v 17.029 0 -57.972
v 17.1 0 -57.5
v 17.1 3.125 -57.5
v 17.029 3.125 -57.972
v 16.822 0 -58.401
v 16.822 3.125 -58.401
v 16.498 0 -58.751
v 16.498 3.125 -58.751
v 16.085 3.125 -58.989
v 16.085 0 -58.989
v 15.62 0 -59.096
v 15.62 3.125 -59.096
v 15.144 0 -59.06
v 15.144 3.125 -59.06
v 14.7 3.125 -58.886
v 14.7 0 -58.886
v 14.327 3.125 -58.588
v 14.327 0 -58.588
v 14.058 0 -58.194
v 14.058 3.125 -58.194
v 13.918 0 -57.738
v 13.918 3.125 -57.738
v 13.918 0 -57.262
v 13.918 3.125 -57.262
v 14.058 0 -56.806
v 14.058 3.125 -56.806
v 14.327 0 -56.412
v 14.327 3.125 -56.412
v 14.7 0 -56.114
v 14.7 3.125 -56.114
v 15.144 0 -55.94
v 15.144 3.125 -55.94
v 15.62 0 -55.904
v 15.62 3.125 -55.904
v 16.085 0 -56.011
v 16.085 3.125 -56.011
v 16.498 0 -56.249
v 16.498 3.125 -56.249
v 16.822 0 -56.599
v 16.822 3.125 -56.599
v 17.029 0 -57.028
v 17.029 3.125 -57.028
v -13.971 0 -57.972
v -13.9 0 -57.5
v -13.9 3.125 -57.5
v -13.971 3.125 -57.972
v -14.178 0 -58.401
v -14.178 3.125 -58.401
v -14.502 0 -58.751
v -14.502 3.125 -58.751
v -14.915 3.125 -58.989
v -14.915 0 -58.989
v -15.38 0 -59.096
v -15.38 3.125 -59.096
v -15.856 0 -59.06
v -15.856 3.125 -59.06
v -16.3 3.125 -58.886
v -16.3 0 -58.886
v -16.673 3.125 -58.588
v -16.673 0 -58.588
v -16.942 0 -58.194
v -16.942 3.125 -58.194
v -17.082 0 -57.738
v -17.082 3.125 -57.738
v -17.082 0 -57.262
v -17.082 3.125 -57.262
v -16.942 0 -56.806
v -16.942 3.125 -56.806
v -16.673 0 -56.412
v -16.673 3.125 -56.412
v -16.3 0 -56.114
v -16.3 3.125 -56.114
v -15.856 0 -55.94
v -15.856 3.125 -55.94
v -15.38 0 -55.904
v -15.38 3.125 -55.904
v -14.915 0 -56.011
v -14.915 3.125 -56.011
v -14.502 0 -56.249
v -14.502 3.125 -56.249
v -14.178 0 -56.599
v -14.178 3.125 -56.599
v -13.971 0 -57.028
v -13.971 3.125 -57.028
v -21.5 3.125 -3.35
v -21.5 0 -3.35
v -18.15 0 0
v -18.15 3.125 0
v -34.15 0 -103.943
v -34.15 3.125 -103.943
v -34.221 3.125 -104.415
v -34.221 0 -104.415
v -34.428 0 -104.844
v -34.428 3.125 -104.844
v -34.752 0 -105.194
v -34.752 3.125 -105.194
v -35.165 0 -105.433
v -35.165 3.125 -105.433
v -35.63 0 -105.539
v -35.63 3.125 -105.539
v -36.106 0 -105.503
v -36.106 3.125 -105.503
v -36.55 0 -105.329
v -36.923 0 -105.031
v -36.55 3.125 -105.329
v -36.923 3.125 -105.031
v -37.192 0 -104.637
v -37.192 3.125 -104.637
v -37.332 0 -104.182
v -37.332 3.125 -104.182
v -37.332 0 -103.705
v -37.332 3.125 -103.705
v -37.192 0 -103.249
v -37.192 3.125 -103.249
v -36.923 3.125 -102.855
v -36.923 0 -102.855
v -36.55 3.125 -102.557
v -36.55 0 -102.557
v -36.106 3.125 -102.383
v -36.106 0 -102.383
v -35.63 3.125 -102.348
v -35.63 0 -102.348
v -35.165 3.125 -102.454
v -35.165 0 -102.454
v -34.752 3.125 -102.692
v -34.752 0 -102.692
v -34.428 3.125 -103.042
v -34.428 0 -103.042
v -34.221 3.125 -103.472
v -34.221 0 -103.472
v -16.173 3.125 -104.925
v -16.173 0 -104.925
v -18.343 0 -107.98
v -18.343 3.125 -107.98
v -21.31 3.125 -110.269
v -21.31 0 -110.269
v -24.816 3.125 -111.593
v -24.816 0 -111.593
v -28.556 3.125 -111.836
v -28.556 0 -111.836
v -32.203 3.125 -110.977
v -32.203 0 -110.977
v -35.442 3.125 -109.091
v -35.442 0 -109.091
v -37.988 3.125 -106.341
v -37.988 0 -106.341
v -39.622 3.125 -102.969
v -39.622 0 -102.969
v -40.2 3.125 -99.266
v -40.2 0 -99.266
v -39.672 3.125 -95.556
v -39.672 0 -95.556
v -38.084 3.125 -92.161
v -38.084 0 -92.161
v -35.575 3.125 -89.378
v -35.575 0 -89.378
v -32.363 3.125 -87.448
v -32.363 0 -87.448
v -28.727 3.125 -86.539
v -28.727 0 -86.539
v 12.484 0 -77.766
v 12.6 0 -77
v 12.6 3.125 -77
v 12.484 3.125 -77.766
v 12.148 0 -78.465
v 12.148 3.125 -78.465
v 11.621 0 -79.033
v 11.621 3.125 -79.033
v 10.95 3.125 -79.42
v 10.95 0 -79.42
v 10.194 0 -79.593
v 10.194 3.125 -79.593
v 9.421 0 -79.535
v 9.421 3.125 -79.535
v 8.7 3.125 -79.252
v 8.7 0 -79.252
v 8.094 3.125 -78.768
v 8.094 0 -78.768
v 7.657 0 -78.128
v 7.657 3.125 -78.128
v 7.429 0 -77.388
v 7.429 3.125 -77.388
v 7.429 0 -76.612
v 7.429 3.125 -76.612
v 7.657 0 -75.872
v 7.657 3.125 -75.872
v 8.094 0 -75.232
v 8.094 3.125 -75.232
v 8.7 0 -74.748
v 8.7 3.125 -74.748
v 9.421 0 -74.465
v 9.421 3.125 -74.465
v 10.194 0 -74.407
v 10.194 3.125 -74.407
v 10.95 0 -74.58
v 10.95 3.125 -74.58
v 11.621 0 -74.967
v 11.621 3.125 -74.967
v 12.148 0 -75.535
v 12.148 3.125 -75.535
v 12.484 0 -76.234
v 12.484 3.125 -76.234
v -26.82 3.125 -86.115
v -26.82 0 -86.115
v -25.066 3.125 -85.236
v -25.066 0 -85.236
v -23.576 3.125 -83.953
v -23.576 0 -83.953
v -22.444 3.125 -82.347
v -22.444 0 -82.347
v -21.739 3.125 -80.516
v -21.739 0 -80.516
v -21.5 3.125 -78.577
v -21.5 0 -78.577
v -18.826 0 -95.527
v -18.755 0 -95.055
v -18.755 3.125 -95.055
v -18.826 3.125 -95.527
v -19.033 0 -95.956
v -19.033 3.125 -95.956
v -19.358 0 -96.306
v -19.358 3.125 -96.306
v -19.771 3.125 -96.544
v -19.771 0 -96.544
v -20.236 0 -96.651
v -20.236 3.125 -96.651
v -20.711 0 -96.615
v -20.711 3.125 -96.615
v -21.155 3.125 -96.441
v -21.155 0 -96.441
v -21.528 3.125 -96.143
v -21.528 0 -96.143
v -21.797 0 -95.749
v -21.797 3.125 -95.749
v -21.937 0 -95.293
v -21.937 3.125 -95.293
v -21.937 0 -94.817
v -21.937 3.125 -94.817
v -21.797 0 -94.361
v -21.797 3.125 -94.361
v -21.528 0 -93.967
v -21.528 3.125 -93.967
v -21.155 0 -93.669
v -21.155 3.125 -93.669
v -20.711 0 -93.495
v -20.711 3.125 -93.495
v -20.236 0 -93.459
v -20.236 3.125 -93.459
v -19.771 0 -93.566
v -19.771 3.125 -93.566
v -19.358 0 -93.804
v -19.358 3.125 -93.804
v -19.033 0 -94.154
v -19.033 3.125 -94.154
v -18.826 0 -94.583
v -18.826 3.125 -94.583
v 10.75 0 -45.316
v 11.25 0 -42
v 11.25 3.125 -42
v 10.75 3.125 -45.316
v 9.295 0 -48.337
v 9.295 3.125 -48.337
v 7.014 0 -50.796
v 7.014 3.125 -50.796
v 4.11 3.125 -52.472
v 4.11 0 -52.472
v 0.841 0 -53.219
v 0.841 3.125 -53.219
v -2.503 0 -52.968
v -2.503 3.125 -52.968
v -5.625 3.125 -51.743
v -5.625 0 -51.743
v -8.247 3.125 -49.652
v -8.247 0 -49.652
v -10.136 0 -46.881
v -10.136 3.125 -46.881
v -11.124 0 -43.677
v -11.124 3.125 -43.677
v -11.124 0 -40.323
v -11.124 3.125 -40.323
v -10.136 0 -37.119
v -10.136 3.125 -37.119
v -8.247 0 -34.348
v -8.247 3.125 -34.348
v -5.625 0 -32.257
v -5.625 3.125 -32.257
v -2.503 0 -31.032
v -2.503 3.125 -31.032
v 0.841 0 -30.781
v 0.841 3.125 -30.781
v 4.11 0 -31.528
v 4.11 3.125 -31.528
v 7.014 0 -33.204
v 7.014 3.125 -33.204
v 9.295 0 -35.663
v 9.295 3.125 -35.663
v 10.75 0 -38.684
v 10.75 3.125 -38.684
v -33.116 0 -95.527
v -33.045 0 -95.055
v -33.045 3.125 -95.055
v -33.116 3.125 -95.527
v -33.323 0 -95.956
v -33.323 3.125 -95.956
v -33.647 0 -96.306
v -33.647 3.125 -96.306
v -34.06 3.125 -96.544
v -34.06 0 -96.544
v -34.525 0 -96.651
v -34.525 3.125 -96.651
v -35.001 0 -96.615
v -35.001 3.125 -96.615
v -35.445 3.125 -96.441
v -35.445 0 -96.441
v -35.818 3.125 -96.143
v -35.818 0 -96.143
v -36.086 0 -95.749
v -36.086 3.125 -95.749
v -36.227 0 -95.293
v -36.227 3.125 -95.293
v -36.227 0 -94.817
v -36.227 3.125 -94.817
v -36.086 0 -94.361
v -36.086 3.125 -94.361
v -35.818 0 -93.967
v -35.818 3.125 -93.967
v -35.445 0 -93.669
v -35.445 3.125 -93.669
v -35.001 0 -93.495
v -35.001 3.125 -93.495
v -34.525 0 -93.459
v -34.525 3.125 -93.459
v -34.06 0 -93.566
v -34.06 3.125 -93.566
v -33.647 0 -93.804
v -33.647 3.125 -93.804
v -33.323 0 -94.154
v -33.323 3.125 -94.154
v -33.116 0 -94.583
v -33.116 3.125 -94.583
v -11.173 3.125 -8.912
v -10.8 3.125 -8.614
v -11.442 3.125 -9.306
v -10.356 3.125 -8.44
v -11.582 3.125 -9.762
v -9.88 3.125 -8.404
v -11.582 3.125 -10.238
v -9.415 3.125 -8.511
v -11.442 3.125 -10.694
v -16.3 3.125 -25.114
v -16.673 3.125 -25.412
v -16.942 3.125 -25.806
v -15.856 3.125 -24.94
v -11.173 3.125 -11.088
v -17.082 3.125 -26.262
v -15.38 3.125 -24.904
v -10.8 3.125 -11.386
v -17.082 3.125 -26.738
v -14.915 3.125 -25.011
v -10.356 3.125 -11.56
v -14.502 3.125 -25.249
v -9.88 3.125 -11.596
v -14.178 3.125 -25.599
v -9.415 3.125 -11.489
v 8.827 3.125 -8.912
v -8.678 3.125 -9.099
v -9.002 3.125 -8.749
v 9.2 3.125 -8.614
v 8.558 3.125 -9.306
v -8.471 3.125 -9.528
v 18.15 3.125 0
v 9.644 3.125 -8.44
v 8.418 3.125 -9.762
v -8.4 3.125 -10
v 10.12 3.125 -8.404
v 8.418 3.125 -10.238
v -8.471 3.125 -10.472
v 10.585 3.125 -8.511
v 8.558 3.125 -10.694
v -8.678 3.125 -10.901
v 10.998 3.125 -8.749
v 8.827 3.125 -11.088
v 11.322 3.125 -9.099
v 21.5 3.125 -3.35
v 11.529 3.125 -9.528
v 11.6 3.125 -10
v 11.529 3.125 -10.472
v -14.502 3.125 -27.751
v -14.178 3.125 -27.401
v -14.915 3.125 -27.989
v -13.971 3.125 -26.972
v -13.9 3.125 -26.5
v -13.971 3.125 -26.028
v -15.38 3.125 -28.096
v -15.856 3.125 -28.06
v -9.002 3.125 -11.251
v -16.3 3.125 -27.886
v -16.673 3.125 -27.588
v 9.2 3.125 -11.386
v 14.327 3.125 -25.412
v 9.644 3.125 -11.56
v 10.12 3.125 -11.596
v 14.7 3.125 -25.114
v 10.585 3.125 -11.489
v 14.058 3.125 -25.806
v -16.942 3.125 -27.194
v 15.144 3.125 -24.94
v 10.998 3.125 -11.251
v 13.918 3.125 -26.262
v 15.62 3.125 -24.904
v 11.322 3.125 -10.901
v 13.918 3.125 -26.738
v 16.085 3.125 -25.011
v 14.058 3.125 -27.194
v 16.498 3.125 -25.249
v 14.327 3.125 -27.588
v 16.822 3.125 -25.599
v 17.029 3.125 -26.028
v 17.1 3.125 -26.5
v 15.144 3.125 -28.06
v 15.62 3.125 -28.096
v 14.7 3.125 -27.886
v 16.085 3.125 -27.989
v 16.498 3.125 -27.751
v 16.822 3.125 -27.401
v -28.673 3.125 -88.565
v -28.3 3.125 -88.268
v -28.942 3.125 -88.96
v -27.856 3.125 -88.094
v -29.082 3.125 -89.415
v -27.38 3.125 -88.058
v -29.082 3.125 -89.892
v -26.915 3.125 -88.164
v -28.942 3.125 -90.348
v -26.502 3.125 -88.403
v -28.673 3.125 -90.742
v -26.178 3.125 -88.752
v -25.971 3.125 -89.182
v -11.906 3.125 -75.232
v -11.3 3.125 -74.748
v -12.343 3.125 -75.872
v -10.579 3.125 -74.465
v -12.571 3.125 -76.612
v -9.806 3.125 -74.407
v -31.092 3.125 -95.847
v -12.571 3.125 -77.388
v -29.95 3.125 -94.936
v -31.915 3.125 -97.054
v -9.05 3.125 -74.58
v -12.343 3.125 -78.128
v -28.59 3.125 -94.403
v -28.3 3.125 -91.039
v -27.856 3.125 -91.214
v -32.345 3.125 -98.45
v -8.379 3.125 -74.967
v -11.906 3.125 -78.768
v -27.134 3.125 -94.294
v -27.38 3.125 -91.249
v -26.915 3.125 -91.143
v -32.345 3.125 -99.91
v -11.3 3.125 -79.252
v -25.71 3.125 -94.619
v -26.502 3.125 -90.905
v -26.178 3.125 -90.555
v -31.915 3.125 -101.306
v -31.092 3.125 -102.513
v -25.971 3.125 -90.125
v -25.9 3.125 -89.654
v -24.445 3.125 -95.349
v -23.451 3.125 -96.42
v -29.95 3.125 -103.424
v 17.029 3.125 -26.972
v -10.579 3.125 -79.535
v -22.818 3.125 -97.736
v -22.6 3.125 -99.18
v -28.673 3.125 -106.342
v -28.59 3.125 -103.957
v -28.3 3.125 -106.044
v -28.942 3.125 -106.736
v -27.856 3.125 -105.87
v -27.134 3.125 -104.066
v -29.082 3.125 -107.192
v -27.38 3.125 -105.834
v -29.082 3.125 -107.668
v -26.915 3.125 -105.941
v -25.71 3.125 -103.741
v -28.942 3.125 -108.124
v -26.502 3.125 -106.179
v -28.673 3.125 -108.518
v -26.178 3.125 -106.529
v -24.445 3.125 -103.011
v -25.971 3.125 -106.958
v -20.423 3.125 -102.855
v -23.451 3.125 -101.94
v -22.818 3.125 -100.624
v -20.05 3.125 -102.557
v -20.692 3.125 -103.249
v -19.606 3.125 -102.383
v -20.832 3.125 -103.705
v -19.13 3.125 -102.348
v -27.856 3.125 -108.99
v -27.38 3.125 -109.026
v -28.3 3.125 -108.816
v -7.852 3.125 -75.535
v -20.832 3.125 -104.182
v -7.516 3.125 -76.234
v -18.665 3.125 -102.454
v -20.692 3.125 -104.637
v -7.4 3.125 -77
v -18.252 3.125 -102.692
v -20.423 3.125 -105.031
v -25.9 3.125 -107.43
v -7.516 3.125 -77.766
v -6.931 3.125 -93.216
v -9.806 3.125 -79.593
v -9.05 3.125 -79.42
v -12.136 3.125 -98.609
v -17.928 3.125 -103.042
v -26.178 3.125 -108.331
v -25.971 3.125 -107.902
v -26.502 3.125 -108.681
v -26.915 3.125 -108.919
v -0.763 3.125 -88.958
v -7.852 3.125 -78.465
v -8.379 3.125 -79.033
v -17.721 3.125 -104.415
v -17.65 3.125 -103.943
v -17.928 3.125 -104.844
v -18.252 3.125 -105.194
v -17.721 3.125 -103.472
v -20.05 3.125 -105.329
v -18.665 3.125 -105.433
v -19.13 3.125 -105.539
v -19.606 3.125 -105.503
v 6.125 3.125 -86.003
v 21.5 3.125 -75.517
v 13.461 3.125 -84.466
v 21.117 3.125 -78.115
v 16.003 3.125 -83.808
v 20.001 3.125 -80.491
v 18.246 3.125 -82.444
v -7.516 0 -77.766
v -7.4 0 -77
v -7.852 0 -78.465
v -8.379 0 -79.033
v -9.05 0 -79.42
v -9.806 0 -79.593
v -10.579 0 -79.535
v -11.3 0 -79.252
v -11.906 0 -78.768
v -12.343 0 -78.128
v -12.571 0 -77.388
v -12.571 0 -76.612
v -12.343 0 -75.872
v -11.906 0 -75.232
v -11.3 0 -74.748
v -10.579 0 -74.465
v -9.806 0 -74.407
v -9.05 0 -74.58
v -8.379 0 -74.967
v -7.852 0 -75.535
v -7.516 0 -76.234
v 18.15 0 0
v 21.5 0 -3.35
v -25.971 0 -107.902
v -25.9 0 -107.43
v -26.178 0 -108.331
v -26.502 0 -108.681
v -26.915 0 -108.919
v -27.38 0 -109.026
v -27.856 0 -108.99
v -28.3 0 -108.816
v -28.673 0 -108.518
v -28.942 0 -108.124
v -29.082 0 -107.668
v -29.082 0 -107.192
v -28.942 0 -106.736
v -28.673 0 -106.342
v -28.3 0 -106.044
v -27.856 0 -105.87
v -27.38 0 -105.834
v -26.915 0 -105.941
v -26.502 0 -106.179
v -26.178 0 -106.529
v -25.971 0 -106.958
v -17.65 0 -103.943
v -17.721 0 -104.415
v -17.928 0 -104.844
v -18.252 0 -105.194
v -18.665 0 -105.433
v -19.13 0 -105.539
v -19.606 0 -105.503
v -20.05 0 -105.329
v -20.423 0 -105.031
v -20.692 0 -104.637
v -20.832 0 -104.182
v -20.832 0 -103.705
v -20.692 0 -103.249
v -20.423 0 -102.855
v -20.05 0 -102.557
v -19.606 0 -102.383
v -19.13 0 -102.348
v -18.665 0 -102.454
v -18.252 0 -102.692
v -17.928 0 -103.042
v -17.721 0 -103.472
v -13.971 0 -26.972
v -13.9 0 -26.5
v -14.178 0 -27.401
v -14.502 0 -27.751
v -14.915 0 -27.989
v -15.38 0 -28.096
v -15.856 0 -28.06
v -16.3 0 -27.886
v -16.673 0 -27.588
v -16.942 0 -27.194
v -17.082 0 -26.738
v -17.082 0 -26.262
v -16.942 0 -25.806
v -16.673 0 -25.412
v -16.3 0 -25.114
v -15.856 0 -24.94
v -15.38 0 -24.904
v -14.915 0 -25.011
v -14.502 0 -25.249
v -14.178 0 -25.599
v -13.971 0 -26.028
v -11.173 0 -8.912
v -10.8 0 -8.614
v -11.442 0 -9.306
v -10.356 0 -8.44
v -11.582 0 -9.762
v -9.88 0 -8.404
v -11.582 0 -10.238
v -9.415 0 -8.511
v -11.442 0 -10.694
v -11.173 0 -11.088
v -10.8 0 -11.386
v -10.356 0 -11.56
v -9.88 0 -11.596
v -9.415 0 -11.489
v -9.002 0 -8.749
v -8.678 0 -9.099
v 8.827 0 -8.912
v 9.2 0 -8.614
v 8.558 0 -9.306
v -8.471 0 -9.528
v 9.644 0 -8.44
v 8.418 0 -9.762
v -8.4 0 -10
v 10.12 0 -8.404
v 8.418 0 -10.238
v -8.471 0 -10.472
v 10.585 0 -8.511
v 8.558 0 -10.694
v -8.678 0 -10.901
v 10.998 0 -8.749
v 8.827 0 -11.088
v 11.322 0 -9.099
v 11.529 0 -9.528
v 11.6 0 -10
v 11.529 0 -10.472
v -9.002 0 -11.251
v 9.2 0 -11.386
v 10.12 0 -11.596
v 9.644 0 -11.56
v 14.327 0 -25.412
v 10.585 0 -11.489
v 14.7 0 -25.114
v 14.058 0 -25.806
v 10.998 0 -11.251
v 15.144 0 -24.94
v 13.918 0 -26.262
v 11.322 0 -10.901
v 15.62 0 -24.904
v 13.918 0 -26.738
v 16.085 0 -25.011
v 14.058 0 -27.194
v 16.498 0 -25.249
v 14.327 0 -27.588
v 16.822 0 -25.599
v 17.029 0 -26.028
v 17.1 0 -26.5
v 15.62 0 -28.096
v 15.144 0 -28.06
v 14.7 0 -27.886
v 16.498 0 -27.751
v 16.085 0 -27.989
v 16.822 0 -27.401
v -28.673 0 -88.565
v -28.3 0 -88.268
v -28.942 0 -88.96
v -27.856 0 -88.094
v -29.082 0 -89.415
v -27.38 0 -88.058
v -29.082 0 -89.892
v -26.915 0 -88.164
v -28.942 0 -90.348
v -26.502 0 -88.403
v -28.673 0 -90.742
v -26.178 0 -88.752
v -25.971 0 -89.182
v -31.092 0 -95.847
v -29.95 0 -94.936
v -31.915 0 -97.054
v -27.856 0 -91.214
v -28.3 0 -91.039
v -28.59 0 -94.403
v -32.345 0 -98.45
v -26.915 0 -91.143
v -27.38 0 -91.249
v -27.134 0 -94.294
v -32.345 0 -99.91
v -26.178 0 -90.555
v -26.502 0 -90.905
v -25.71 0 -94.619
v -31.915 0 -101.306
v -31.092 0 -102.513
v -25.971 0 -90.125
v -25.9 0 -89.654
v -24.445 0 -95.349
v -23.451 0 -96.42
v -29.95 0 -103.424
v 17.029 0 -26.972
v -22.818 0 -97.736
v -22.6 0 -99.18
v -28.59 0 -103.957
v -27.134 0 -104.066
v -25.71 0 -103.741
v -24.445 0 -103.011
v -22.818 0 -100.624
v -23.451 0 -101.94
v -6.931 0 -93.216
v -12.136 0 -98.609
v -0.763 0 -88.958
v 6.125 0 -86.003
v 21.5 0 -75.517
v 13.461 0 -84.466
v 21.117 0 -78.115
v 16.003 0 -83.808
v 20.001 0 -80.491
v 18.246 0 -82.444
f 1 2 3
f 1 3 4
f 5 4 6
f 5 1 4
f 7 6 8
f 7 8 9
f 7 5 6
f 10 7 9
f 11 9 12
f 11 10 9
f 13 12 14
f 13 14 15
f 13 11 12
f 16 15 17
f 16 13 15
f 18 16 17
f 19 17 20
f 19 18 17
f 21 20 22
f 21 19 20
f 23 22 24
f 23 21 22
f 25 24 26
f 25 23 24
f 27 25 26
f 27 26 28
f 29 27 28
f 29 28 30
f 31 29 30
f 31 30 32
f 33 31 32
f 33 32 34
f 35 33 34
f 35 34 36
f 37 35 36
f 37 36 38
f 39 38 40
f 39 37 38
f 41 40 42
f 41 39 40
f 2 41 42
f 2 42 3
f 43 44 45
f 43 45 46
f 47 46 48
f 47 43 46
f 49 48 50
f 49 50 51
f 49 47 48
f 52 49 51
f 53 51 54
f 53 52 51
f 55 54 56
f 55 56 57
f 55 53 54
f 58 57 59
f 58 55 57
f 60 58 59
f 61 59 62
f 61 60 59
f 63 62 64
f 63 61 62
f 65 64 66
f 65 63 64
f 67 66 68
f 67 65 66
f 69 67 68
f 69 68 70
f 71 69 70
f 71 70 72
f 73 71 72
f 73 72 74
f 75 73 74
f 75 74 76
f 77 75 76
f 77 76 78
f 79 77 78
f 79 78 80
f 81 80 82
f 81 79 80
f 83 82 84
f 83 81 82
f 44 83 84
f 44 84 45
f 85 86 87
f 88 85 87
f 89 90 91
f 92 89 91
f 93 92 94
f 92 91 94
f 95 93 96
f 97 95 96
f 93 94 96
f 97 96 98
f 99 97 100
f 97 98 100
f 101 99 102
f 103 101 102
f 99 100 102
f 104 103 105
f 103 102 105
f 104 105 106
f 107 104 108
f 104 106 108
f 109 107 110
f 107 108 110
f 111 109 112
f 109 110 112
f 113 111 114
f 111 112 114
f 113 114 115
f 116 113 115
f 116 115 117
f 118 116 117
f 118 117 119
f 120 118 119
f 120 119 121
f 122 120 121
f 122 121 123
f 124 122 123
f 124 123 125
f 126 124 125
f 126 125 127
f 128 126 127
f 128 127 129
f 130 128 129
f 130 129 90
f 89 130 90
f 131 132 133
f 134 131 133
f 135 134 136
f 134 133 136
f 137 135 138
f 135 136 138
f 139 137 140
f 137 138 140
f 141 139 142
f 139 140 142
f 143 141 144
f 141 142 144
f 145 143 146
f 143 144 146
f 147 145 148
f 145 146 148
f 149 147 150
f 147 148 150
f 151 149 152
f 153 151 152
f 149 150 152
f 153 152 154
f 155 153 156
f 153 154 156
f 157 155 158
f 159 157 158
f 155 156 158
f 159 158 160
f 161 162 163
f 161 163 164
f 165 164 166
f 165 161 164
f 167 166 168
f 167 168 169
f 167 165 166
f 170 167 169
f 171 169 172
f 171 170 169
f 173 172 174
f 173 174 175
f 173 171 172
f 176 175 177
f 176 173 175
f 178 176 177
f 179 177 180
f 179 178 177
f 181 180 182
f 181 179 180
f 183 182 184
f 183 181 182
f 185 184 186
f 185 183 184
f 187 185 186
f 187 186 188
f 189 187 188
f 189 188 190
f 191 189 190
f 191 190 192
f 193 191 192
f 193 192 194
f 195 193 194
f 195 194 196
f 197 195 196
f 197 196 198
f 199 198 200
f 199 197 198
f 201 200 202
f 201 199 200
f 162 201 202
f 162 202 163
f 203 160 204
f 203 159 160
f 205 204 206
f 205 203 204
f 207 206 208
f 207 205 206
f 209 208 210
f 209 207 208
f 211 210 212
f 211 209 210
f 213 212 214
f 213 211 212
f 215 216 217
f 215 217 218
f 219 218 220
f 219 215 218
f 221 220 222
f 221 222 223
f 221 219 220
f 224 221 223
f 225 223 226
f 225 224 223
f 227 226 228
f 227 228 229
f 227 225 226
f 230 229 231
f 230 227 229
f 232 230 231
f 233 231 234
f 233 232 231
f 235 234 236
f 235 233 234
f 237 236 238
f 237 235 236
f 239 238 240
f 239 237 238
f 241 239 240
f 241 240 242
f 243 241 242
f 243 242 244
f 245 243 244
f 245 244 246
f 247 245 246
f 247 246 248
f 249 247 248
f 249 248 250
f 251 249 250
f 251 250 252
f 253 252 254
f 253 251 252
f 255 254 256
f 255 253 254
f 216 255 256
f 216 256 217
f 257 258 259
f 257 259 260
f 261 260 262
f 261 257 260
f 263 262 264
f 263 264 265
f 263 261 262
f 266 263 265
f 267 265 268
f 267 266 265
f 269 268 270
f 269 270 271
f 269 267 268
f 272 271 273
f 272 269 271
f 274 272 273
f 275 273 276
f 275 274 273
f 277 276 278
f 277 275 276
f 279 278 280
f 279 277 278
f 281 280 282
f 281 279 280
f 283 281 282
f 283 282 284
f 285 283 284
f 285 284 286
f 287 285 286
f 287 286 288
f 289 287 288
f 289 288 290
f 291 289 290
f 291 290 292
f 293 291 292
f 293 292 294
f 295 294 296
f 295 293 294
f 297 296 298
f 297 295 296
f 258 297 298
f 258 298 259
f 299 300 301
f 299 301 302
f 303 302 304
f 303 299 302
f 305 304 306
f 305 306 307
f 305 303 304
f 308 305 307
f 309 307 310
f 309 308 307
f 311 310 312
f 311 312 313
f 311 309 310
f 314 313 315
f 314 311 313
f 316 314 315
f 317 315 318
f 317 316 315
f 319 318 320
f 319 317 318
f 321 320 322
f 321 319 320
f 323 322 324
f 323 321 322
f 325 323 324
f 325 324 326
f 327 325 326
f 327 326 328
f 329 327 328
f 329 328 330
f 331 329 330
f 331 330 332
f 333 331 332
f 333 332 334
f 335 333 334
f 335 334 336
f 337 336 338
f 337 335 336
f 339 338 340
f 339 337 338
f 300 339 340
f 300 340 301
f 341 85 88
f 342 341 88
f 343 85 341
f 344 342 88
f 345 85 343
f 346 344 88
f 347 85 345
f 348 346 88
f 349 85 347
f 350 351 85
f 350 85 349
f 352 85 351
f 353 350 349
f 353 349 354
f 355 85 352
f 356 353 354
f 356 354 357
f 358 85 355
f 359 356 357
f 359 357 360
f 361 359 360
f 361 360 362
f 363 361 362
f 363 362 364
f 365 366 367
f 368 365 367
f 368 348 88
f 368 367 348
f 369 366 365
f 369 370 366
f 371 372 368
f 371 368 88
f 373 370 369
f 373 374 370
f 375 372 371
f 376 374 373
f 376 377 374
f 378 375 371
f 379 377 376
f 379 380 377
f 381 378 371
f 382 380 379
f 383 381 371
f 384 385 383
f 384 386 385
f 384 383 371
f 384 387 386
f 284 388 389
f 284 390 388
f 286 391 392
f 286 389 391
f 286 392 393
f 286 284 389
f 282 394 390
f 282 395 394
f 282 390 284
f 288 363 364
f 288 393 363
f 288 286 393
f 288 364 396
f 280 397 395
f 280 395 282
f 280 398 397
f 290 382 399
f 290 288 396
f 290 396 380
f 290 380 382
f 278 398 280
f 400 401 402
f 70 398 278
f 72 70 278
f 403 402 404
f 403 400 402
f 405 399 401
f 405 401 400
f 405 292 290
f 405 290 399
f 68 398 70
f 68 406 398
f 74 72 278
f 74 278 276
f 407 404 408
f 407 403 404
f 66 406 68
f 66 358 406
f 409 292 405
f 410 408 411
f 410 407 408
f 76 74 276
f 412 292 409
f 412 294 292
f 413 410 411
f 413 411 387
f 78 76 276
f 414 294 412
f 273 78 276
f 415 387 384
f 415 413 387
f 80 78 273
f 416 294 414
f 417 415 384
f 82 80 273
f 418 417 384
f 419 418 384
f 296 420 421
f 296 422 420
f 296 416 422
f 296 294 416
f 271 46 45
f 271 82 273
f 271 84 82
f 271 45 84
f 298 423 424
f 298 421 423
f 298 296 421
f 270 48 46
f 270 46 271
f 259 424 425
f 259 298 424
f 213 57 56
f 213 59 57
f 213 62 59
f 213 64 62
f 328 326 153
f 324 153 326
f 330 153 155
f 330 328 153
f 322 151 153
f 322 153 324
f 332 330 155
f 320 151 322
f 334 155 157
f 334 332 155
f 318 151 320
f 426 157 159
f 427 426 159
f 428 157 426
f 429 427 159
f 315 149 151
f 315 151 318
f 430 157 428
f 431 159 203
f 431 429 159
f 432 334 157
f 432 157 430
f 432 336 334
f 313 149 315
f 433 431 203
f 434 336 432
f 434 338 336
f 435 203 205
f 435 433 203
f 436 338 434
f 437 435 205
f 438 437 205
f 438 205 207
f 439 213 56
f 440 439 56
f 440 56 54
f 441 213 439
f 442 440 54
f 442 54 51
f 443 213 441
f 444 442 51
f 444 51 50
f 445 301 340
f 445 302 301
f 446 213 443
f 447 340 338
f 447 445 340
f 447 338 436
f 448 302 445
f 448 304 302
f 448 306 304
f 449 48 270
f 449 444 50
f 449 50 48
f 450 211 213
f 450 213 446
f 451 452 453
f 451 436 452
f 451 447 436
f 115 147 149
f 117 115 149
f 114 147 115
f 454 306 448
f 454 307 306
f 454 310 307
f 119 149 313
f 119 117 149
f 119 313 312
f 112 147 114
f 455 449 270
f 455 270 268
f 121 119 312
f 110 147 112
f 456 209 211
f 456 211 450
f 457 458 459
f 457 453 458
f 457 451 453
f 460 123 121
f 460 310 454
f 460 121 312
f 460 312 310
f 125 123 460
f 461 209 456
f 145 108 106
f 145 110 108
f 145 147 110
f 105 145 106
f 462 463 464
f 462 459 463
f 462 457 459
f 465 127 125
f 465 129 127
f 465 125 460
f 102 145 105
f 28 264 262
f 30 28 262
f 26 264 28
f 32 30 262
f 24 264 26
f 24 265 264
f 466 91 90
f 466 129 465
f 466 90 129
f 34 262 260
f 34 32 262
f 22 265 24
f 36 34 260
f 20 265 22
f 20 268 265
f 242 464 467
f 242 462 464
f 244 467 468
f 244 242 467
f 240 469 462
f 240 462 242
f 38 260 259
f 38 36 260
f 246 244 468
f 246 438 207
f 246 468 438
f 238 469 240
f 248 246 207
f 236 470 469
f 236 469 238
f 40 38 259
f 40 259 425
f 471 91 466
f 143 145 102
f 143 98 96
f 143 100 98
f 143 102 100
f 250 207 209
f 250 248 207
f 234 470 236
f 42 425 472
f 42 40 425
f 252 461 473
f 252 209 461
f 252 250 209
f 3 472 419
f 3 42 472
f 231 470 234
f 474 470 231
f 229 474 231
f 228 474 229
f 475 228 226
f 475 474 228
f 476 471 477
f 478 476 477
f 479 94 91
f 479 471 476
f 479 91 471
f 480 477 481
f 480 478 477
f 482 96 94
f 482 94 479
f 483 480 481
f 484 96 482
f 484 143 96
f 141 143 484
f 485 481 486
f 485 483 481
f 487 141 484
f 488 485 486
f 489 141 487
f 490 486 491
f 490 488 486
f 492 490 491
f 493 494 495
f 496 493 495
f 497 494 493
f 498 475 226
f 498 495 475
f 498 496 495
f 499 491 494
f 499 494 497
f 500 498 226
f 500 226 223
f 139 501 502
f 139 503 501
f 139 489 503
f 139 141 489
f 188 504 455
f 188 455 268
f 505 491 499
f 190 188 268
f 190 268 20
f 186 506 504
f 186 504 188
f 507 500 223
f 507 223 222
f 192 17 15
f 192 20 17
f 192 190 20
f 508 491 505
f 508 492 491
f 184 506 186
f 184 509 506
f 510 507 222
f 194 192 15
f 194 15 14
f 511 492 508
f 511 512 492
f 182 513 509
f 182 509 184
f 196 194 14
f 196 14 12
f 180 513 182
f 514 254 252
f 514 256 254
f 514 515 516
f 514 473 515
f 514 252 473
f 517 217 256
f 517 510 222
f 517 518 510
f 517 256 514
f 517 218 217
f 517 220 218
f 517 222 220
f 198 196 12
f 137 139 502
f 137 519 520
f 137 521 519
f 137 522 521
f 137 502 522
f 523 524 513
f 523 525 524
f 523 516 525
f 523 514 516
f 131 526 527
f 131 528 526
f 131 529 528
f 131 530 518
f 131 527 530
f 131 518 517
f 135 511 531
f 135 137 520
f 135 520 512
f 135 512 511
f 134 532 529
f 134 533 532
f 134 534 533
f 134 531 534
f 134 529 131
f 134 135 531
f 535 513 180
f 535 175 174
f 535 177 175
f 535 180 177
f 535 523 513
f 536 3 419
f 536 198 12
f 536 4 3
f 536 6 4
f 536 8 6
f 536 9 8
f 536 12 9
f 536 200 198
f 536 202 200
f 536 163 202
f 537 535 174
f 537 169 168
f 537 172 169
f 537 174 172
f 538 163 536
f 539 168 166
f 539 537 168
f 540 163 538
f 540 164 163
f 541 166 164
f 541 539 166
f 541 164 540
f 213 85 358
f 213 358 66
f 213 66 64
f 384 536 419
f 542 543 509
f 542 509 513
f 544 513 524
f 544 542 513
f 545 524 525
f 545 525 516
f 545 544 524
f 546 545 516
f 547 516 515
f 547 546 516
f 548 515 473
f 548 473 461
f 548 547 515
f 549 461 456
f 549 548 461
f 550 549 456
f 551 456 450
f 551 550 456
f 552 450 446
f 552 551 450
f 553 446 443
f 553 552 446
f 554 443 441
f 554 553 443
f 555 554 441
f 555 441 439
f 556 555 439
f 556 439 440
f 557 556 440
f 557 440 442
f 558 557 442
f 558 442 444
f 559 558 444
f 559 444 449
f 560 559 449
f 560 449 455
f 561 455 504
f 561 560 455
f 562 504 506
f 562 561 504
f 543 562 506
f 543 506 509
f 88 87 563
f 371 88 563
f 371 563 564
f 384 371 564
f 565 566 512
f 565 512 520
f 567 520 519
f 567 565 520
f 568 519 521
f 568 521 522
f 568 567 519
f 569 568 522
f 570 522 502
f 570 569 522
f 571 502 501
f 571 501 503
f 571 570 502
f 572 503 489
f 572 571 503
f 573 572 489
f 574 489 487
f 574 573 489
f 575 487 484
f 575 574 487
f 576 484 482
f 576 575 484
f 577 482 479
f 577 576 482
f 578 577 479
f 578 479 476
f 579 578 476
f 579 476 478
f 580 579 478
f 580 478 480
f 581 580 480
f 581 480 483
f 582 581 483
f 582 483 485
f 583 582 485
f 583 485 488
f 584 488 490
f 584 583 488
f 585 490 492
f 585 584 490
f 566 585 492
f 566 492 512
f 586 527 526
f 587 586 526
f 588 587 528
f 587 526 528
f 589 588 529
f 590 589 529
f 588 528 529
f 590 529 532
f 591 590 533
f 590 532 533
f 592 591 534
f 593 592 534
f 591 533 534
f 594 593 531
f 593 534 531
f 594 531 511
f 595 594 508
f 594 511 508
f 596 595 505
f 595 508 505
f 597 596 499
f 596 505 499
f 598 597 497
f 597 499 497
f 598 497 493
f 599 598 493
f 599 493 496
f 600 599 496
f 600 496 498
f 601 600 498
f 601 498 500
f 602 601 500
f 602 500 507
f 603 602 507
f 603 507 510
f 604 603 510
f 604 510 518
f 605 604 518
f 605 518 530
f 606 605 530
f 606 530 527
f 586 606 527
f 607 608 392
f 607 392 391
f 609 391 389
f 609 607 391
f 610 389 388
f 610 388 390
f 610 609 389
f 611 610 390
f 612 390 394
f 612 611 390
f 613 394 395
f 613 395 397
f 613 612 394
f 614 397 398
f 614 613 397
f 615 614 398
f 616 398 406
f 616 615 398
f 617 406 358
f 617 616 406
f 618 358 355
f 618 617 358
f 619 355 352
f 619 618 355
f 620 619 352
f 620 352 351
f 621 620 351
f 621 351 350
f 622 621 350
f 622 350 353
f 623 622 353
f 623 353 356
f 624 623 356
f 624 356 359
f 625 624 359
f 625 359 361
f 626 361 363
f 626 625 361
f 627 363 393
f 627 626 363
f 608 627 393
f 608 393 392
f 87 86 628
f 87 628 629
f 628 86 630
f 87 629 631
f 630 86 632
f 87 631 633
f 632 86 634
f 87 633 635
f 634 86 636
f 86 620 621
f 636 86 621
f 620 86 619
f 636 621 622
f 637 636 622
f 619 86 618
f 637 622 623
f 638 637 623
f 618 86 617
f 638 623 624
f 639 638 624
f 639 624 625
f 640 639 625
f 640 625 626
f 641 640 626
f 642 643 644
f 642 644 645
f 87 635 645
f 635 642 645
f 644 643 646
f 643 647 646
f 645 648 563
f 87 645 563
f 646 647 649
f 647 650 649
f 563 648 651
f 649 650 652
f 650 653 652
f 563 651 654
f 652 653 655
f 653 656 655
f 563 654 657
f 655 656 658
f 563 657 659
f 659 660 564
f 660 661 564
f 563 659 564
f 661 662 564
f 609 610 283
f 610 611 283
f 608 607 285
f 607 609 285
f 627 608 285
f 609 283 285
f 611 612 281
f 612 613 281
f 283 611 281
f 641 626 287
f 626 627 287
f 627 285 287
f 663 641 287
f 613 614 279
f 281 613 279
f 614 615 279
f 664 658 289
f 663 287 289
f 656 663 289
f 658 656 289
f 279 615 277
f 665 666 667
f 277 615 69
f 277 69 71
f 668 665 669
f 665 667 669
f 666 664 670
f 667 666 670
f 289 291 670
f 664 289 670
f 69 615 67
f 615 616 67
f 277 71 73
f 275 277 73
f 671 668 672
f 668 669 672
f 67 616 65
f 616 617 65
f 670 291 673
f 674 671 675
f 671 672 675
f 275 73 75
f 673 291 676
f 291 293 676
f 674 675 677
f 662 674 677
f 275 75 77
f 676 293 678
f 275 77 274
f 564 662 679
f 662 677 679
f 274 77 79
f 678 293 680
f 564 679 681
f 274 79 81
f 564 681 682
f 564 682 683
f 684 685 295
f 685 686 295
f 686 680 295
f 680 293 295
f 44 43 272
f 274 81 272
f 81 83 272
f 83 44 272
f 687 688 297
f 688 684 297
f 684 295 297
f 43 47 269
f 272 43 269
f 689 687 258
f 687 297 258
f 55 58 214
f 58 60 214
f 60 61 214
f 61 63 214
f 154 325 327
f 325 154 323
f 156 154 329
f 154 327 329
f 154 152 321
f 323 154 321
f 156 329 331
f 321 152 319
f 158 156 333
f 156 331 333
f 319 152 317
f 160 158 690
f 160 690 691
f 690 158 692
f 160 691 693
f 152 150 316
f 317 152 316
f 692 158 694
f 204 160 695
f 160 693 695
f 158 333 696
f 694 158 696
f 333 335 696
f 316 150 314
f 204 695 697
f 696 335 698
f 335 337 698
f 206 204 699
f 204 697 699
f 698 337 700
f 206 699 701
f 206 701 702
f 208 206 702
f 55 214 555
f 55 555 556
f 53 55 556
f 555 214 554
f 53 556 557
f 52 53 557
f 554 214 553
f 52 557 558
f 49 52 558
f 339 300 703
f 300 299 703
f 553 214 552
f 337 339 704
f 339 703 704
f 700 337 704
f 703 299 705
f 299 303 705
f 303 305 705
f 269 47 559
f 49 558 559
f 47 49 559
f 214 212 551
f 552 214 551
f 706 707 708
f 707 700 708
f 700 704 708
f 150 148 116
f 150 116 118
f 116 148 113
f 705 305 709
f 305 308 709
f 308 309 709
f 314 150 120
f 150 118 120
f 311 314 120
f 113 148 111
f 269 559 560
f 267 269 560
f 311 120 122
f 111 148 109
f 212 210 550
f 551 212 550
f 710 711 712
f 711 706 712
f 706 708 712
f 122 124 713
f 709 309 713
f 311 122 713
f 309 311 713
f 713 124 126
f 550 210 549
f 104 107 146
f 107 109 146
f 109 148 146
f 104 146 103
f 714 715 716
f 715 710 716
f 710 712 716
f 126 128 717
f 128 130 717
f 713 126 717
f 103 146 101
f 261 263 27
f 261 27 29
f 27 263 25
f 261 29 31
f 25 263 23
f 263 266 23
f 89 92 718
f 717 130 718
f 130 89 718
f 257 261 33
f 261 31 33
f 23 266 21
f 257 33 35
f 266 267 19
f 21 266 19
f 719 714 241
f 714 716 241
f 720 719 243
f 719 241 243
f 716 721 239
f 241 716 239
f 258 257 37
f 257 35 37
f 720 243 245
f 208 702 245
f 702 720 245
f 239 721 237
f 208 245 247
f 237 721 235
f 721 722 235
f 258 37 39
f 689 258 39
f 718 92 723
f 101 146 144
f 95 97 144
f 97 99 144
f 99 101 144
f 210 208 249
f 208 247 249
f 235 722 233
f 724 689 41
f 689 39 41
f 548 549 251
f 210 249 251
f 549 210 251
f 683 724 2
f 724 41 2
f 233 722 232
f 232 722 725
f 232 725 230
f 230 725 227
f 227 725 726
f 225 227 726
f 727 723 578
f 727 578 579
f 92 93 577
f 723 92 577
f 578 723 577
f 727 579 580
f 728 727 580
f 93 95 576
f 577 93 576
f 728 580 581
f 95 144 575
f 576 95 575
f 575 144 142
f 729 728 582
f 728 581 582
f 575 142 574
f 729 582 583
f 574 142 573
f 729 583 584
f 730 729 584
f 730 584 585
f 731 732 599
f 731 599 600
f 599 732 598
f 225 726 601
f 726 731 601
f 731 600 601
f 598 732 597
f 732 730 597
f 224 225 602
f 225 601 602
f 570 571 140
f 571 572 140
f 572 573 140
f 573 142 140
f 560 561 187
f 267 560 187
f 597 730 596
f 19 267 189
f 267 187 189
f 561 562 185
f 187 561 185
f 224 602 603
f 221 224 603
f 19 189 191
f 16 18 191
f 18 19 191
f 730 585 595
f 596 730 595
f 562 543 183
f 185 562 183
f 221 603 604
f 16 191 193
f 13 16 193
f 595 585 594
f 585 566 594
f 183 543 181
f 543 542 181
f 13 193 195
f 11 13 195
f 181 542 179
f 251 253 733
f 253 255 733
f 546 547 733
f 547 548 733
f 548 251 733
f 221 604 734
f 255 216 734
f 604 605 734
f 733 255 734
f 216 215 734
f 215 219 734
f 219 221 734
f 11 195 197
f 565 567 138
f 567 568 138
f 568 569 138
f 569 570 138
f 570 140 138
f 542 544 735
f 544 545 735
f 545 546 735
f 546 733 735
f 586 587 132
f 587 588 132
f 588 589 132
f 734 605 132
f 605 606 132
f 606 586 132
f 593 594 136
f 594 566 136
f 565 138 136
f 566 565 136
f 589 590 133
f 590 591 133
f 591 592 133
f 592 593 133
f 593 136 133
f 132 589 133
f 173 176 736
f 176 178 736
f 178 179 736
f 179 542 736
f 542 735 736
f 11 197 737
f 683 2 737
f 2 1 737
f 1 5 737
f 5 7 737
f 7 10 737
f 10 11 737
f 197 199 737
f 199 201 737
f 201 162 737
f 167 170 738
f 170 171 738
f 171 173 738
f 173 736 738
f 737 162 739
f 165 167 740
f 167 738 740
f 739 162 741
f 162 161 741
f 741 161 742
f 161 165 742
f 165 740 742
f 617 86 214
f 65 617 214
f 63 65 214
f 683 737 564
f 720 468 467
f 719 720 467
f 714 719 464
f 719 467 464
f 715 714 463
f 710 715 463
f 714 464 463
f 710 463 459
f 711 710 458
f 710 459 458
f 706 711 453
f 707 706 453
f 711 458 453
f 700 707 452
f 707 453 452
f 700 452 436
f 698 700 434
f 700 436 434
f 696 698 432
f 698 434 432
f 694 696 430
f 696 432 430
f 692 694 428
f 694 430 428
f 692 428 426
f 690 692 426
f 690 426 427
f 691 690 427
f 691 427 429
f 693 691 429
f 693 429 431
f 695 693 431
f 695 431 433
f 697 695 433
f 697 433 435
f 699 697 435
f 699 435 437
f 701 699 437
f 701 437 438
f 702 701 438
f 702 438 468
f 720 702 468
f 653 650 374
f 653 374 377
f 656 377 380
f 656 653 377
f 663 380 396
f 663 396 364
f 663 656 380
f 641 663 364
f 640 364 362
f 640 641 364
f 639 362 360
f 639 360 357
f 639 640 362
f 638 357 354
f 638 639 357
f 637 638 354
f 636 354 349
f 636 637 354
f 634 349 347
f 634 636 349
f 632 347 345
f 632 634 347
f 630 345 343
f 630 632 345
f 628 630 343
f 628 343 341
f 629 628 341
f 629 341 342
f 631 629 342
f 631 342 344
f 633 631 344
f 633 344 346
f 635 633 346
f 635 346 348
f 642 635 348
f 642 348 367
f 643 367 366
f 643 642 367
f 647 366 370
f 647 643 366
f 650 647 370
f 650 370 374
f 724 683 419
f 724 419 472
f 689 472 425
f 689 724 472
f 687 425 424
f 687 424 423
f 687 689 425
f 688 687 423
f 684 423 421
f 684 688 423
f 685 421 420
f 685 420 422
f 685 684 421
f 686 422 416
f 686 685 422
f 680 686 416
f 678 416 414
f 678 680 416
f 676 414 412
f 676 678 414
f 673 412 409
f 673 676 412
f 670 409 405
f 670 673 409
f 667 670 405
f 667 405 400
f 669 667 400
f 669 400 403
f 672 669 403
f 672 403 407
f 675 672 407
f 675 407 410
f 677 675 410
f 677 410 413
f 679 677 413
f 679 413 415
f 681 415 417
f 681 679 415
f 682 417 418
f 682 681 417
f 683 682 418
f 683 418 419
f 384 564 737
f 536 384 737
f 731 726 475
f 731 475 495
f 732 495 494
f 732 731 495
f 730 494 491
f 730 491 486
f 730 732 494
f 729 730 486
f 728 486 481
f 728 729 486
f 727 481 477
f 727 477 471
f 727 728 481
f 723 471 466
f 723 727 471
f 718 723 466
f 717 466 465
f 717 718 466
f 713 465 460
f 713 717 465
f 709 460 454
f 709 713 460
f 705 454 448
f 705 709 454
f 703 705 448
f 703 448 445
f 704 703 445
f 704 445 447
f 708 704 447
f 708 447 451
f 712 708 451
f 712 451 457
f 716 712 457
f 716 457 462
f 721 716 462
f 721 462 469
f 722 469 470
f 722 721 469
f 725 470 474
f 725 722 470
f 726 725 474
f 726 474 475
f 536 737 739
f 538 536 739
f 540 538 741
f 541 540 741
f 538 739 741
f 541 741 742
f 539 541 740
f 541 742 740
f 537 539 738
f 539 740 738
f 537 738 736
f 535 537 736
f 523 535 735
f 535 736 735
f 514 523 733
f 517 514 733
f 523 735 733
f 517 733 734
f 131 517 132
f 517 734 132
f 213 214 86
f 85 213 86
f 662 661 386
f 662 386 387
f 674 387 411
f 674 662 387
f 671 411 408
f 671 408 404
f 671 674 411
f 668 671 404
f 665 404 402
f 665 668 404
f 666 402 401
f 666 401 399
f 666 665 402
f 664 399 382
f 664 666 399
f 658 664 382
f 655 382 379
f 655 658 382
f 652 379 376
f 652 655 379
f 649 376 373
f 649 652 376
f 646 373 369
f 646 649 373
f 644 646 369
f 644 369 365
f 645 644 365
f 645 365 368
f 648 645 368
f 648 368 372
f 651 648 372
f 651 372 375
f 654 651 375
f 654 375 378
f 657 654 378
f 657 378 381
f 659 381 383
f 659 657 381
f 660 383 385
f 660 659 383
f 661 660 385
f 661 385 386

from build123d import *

# Parameters (mm, degrees)
SKETCH1_R           = 4.9
SKETCH1_R_2         = 2.6
SKETCH1_R_3         = 1.6
SKETCH1_R_4         = 11.25
BOSS_EXTRUDE1_DEPTH = 3.125
FILLET1_R           = 8
CUT_EXTRUDE1_REACH  = 5.125
SKETCH3_R           = 1.6


with BuildPart() as part:
    # Sketch1 → Boss-Extrude1 (new body)
    with BuildSketch(Plane(origin=(0, 0, 0), x_dir=(1, 0, 0), z_dir=(0, 1, 0))):
        with BuildLine():
            Line((-27.5, 86.48), (-21.5, 86.48))
            Line((-21.5, 86.48), (-21.5, 3.35))
            Line((-21.5, 3.35), (-18.15, 0))
            Line((-18.15, 0), (18.15, 0))
            Line((18.15, 0), (21.5, 3.35))
            Line((21.5, 3.35), (21.5, 75.517491819))
            ThreePointArc((21.5, 75.517491819), (19.195241391, 81.531952951), (13.461390508, 84.465996068))
            ThreePointArc((13.461390508, 84.465996068), (-3.952756456, 90.933879006), (-16.17349063, 104.924578791))
            ThreePointArc((-16.17349063, 104.924578791), (-38.32234149, 105.825820091), (-27.5, 86.48))
        make_face()
        with Locations((-27.5, 99.18)):
            Circle(SKETCH1_R, mode=Mode.SUBTRACT)
        with Locations((10, 77)):
            Circle(SKETCH1_R_2, mode=Mode.SUBTRACT)
        with Locations((-10, 77)):
            Circle(SKETCH1_R_2, mode=Mode.SUBTRACT)
        with Locations((10, 10)):
            Circle(SKETCH1_R_3, mode=Mode.SUBTRACT)
        with Locations((-10, 10)):
            Circle(SKETCH1_R_3, mode=Mode.SUBTRACT)
        with Locations((-20.355290419, 95.055)):
            Circle(SKETCH1_R_3, mode=Mode.SUBTRACT)
        with Locations((-34.644709581, 95.055)):
            Circle(SKETCH1_R_3, mode=Mode.SUBTRACT)
        with Locations((-27.5, 107.43)):
            Circle(SKETCH1_R_3, mode=Mode.SUBTRACT)
        with Locations((0, 42)):
            Circle(SKETCH1_R_4, mode=Mode.SUBTRACT)
        with Locations((-15.5, 26.5)):
            Circle(SKETCH1_R_3, mode=Mode.SUBTRACT)
        with Locations((-15.5, 57.5)):
            Circle(SKETCH1_R_3, mode=Mode.SUBTRACT)
        with Locations((15.5, 57.5)):
            Circle(SKETCH1_R_3, mode=Mode.SUBTRACT)
        with Locations((15.5, 26.5)):
            Circle(SKETCH1_R_3, mode=Mode.SUBTRACT)
    extrude(amount=BOSS_EXTRUDE1_DEPTH)

    # Fillet1
    fillet1_edges = [part.edges().sort_by_distance(p)[0] for p in [
        (-21.5, 1.5625, -86.48),
    ]]
    fillet(fillet1_edges, radius=FILLET1_R)

    # Sketch3 → Cut-Extrude1 (cut, up to next)
    with BuildSketch(Plane(origin=(0, 3.125, 0), x_dir=(1, 0, 0), z_dir=(0, 1, 0)), mode=Mode.PRIVATE) as cut_extrude1_sk1:
        with Locations((-27.5, 89.653720558)):
            Circle(SKETCH3_R)
    cut_extrude1_tool1 = extrude(cut_extrude1_sk1.sketch, amount=-CUT_EXTRUDE1_REACH, mode=Mode.PRIVATE) & part.part
    add(cut_extrude1_tool1.solids().sort_by_distance((-27.5, 3.125, -89.653721))[0], mode=Mode.SUBTRACT)
    # Sketch3 → Cut-Extrude1 (cut, up to next)
    with BuildSketch(Plane(origin=(0, 3.125, 0), x_dir=(1, 0, 0), z_dir=(0, 1, 0)), mode=Mode.PRIVATE) as cut_extrude1_sk2:
        with Locations((-35.75, 103.943139721)):
            Circle(SKETCH3_R)
    cut_extrude1_tool2 = extrude(cut_extrude1_sk2.sketch, amount=-CUT_EXTRUDE1_REACH, mode=Mode.PRIVATE) & part.part
    add(cut_extrude1_tool2.solids().sort_by_distance((-35.75, 3.125, -103.94314))[0], mode=Mode.SUBTRACT)
    # Sketch3 → Cut-Extrude1 (cut, up to next)
    with BuildSketch(Plane(origin=(0, 3.125, 0), x_dir=(1, 0, 0), z_dir=(0, 1, 0)), mode=Mode.PRIVATE) as cut_extrude1_sk3:
        with Locations((-19.25, 103.943139721)):
            Circle(SKETCH3_R)
    cut_extrude1_tool3 = extrude(cut_extrude1_sk3.sketch, amount=-CUT_EXTRUDE1_REACH, mode=Mode.PRIVATE) & part.part
    add(cut_extrude1_tool3.solids().sort_by_distance((-19.25, 3.125, -103.94314))[0], mode=Mode.SUBTRACT)


solid = part.part
